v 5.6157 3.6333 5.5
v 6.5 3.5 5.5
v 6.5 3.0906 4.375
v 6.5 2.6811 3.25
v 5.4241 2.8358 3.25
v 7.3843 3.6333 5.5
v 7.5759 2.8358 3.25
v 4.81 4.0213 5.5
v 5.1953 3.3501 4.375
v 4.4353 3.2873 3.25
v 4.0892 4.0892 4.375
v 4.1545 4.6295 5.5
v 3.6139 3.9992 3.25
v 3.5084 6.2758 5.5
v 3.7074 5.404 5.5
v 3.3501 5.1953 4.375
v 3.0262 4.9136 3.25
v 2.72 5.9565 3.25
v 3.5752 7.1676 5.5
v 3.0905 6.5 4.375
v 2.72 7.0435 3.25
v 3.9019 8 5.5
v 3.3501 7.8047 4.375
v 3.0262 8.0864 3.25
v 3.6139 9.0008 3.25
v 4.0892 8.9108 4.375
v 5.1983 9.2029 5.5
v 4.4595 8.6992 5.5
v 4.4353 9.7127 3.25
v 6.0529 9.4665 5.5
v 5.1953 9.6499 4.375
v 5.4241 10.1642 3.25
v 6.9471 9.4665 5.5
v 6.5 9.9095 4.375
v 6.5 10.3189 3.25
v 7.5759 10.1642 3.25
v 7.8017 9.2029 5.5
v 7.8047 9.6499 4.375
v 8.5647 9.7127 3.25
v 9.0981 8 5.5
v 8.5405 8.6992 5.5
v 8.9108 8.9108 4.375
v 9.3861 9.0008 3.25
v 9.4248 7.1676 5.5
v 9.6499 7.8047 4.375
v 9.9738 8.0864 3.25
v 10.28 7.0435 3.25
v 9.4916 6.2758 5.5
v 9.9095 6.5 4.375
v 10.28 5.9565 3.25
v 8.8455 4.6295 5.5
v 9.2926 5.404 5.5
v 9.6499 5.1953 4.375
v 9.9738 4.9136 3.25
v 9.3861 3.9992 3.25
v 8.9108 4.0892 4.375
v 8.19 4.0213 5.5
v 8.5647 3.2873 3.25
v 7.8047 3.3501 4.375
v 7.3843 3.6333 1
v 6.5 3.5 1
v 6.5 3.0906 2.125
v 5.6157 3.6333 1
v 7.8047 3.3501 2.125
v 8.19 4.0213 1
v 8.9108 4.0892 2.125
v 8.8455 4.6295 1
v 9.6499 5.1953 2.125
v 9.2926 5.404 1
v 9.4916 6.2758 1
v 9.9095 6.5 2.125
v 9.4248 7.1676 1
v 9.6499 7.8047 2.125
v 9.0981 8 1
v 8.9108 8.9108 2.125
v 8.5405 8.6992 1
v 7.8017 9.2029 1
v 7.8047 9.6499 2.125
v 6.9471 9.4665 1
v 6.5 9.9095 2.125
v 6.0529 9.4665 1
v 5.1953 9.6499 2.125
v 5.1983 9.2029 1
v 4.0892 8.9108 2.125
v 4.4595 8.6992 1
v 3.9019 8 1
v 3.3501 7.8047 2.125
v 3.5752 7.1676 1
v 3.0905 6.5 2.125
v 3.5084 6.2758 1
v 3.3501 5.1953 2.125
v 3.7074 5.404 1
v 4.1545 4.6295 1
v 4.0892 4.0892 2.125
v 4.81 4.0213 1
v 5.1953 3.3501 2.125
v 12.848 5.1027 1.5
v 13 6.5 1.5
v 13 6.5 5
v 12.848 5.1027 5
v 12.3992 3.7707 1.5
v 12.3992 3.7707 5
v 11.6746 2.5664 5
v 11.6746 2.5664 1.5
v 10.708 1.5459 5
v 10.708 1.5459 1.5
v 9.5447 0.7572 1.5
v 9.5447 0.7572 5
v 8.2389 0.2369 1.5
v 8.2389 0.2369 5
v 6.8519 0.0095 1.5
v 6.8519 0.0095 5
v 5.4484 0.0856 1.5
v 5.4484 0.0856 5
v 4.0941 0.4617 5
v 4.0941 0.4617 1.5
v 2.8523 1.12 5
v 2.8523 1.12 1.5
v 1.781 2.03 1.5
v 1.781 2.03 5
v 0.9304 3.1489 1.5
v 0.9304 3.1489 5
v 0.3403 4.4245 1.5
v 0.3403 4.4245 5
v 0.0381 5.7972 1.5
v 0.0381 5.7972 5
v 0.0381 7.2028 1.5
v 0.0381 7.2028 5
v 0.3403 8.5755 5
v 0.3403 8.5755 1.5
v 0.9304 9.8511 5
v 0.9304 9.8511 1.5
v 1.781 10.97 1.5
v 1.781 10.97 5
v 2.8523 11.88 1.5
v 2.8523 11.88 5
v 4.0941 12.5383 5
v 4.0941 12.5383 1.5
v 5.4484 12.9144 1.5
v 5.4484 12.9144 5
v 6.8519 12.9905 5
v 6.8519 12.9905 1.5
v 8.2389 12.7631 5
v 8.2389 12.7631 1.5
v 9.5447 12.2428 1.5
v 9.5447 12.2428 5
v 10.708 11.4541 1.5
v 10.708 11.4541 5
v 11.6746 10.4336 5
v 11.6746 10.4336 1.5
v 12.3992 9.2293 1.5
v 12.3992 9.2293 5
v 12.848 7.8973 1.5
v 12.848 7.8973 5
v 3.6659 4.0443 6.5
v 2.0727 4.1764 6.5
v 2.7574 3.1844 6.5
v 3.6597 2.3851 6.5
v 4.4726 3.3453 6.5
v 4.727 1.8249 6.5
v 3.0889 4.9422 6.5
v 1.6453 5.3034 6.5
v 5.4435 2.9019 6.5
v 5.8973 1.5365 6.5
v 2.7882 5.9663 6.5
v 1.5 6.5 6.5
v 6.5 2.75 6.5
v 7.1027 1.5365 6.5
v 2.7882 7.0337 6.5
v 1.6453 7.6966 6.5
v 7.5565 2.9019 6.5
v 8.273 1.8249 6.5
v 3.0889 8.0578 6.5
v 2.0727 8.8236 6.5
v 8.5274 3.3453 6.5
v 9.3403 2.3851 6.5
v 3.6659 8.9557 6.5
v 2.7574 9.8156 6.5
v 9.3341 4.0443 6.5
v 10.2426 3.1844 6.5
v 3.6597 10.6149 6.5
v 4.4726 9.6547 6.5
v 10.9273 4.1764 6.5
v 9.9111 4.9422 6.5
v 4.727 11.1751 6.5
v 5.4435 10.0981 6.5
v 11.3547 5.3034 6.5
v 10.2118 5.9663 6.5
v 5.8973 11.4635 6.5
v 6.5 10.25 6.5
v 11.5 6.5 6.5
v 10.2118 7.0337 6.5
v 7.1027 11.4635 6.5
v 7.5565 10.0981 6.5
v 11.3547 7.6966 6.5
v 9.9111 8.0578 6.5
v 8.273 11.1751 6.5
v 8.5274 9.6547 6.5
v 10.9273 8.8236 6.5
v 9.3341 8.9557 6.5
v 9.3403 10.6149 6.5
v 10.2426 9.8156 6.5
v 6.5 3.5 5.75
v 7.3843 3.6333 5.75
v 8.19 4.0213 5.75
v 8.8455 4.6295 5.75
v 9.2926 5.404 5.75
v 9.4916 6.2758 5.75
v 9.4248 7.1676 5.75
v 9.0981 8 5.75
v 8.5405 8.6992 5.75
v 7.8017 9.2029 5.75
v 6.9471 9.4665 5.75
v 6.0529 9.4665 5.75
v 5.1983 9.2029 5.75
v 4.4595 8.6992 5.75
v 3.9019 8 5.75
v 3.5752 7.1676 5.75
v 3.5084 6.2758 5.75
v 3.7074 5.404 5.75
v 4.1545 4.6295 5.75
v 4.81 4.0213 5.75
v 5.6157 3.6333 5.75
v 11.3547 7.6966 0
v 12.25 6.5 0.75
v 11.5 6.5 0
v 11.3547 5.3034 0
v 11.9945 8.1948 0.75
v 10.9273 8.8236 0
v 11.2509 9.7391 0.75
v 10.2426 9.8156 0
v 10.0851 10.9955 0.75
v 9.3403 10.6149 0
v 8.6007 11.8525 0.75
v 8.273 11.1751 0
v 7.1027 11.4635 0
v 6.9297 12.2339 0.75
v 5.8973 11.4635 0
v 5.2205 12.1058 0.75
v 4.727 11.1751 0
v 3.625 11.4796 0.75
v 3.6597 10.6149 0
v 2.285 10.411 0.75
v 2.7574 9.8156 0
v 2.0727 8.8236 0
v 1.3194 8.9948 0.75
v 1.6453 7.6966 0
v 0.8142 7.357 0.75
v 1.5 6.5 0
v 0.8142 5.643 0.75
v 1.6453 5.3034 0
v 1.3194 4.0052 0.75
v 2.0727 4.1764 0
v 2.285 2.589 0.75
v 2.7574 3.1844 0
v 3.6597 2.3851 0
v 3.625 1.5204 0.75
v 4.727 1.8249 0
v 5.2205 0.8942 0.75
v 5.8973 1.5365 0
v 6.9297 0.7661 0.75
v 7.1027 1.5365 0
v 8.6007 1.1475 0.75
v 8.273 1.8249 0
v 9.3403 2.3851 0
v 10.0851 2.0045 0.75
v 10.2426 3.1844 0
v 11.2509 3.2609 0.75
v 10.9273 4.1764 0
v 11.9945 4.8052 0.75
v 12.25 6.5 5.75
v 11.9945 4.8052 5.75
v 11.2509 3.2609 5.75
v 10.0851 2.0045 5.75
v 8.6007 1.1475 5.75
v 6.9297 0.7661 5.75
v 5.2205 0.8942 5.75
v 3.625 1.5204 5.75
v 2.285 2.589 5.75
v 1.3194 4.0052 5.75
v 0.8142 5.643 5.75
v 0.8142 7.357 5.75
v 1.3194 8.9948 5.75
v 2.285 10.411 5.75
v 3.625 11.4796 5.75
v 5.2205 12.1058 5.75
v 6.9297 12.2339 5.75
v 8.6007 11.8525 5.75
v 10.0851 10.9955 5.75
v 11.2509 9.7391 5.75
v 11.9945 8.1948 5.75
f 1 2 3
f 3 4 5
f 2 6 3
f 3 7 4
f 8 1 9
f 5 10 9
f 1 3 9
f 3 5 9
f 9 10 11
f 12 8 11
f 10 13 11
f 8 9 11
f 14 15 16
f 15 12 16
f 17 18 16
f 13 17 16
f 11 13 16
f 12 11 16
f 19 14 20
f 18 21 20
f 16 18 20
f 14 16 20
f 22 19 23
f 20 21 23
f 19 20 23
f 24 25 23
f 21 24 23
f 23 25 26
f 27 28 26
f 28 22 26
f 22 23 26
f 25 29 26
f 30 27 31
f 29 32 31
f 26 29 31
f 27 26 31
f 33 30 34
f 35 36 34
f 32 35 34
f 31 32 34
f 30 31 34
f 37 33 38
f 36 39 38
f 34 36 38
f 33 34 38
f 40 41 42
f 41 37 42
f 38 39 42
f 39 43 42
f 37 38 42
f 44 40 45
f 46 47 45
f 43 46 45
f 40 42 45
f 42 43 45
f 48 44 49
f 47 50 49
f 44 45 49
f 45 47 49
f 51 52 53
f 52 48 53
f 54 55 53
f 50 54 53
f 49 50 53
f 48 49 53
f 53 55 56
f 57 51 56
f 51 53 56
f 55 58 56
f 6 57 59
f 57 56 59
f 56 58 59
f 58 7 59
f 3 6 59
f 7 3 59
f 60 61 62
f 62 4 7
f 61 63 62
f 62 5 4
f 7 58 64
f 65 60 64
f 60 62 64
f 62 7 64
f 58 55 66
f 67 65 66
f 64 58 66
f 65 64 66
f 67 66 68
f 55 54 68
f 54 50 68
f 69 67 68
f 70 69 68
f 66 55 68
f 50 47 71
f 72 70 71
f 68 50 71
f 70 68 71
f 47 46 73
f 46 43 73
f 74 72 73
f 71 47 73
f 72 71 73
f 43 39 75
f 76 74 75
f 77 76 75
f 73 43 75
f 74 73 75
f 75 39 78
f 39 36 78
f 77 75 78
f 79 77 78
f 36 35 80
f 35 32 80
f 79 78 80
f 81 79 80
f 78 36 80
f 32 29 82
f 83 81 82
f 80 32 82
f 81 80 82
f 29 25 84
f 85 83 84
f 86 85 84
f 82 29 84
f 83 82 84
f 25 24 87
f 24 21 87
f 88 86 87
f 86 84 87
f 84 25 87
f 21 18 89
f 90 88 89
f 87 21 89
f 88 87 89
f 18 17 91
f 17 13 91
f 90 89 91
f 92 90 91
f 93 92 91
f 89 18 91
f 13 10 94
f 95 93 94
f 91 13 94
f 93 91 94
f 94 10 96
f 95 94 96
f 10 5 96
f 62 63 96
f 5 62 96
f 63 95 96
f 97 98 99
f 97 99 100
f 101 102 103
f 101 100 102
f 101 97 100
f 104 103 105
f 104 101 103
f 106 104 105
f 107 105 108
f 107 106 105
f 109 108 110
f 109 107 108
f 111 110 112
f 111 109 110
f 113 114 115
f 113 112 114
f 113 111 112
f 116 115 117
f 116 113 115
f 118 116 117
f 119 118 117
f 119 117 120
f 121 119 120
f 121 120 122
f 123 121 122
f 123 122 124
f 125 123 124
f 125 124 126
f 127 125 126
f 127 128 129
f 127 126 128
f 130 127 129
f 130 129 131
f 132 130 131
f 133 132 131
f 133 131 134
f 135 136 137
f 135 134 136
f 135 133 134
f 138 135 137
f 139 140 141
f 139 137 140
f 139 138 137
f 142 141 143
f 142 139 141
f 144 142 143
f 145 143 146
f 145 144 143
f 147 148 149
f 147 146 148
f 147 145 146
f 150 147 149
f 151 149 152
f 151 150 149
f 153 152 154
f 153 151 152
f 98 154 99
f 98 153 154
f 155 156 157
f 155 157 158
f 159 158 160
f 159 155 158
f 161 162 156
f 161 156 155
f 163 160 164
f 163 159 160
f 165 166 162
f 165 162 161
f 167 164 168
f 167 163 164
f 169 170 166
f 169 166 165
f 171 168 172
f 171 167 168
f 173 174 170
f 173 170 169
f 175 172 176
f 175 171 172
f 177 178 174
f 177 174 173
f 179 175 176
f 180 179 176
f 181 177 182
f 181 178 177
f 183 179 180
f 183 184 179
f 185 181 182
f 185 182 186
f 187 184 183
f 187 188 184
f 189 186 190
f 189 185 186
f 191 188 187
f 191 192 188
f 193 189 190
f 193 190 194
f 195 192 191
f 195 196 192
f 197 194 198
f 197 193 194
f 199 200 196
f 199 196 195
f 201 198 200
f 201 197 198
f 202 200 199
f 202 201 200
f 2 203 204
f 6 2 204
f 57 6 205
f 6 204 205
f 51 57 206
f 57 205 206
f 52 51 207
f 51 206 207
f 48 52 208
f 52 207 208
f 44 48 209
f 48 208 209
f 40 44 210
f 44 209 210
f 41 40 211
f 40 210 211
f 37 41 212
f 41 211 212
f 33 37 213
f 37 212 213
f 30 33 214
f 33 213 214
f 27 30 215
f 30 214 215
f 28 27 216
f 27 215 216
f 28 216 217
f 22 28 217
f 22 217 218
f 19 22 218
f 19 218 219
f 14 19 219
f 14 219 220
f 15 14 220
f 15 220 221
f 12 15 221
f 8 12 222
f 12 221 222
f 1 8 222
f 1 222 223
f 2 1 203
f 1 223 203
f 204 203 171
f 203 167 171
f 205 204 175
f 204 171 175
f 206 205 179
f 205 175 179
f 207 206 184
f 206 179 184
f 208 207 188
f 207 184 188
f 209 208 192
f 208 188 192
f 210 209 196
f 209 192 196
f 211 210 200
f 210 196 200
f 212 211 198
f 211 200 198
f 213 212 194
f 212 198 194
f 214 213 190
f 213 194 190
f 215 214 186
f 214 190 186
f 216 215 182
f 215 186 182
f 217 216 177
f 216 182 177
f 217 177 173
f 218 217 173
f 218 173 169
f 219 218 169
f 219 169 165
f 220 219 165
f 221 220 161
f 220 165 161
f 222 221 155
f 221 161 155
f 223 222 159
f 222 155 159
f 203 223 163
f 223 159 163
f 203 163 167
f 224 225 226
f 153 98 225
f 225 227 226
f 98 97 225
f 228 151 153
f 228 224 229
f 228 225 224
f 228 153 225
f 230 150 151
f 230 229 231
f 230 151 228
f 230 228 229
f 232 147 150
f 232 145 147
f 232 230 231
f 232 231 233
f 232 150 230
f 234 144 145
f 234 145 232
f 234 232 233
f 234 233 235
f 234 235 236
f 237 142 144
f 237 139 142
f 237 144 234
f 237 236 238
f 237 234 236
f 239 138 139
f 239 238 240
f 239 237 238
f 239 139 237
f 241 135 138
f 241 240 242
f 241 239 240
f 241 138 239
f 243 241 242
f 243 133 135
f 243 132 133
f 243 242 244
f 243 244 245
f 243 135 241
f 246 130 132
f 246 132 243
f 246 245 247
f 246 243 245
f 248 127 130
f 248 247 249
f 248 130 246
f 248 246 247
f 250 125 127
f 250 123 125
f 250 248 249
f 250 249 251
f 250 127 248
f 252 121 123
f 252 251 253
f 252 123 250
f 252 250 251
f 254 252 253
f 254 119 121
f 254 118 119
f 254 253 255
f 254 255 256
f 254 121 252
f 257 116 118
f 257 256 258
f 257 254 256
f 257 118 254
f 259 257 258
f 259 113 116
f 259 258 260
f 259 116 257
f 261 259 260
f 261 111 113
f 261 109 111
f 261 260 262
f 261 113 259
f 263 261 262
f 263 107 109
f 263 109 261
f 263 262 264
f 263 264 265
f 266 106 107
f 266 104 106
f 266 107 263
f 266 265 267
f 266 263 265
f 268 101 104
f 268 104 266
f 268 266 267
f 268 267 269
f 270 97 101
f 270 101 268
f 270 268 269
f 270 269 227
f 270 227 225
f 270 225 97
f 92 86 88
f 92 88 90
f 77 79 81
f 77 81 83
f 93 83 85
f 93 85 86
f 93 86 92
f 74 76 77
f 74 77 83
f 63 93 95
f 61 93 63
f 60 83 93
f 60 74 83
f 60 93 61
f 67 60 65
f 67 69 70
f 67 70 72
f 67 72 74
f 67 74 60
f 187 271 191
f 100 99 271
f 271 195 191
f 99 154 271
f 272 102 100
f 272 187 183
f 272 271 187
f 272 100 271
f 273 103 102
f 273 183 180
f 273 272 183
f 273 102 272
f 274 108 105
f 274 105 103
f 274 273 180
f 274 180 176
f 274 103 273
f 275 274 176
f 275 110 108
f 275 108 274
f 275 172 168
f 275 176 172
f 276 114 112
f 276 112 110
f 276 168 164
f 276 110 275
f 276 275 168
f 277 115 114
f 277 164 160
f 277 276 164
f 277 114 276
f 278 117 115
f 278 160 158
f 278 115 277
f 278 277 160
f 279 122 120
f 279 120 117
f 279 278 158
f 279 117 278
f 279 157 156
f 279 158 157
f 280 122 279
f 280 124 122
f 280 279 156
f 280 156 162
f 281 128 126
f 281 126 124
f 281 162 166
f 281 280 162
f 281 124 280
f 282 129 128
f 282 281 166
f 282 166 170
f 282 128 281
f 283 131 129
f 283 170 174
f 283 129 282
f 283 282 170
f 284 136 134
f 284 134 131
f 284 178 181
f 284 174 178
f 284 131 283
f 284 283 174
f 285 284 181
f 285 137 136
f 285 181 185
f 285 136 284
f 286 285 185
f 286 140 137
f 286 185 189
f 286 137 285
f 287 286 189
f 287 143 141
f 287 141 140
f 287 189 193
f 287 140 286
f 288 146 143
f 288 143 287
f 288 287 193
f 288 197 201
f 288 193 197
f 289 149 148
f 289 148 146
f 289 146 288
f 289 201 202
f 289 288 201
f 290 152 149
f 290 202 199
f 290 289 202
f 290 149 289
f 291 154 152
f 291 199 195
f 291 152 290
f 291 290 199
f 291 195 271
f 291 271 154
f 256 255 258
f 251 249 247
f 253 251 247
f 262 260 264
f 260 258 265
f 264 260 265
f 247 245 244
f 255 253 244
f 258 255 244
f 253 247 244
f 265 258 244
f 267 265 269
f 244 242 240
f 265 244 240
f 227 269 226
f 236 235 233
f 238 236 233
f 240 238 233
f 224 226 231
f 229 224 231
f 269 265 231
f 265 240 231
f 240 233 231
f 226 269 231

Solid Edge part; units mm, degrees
sketch "Sketch1" plane through (0, 0, 0) normal (0, 0, 1) x (1, 0, 0)
  circle A0 centre (6.5, 6.5) radius 6.5
extrude "ProtrusiónExtruida_3" add sketch "Sketch1" along normal blind 6.5
sketch "Sketch2" plane through (6.5, 0, 0) normal (1, 0, 0) x (0, 1, 0)
  line L0 (3.5, 6.5) -> (6.5, 6.5)
  line L1 (6.5, 1) -> (6.5, 6.5)
  line L2 (3.5, 1) -> (6.5, 1)
  line L3 (3.5, 1) -> (2.6811, 3.25)
  line L4 (3.5, 5.5) -> (2.6811, 3.25)
  line L5 (3.5, 5.5) -> (3.5, 6.5)
revolve "RevolvedCutout1" cut sketch "Sketch2" angle 360 about axis through (6.5, 6.5, 1) along (0, 0, 1)
chamfer "Chaflán_40" distance 1.5 angle 45 2 edges at (0, 6.5, 6.5) (0, 6.5, 0)
chamfer "Chaflán_41" distance 0.75 angle 45 1 edges at (6.5, 3.5, 6.5)
